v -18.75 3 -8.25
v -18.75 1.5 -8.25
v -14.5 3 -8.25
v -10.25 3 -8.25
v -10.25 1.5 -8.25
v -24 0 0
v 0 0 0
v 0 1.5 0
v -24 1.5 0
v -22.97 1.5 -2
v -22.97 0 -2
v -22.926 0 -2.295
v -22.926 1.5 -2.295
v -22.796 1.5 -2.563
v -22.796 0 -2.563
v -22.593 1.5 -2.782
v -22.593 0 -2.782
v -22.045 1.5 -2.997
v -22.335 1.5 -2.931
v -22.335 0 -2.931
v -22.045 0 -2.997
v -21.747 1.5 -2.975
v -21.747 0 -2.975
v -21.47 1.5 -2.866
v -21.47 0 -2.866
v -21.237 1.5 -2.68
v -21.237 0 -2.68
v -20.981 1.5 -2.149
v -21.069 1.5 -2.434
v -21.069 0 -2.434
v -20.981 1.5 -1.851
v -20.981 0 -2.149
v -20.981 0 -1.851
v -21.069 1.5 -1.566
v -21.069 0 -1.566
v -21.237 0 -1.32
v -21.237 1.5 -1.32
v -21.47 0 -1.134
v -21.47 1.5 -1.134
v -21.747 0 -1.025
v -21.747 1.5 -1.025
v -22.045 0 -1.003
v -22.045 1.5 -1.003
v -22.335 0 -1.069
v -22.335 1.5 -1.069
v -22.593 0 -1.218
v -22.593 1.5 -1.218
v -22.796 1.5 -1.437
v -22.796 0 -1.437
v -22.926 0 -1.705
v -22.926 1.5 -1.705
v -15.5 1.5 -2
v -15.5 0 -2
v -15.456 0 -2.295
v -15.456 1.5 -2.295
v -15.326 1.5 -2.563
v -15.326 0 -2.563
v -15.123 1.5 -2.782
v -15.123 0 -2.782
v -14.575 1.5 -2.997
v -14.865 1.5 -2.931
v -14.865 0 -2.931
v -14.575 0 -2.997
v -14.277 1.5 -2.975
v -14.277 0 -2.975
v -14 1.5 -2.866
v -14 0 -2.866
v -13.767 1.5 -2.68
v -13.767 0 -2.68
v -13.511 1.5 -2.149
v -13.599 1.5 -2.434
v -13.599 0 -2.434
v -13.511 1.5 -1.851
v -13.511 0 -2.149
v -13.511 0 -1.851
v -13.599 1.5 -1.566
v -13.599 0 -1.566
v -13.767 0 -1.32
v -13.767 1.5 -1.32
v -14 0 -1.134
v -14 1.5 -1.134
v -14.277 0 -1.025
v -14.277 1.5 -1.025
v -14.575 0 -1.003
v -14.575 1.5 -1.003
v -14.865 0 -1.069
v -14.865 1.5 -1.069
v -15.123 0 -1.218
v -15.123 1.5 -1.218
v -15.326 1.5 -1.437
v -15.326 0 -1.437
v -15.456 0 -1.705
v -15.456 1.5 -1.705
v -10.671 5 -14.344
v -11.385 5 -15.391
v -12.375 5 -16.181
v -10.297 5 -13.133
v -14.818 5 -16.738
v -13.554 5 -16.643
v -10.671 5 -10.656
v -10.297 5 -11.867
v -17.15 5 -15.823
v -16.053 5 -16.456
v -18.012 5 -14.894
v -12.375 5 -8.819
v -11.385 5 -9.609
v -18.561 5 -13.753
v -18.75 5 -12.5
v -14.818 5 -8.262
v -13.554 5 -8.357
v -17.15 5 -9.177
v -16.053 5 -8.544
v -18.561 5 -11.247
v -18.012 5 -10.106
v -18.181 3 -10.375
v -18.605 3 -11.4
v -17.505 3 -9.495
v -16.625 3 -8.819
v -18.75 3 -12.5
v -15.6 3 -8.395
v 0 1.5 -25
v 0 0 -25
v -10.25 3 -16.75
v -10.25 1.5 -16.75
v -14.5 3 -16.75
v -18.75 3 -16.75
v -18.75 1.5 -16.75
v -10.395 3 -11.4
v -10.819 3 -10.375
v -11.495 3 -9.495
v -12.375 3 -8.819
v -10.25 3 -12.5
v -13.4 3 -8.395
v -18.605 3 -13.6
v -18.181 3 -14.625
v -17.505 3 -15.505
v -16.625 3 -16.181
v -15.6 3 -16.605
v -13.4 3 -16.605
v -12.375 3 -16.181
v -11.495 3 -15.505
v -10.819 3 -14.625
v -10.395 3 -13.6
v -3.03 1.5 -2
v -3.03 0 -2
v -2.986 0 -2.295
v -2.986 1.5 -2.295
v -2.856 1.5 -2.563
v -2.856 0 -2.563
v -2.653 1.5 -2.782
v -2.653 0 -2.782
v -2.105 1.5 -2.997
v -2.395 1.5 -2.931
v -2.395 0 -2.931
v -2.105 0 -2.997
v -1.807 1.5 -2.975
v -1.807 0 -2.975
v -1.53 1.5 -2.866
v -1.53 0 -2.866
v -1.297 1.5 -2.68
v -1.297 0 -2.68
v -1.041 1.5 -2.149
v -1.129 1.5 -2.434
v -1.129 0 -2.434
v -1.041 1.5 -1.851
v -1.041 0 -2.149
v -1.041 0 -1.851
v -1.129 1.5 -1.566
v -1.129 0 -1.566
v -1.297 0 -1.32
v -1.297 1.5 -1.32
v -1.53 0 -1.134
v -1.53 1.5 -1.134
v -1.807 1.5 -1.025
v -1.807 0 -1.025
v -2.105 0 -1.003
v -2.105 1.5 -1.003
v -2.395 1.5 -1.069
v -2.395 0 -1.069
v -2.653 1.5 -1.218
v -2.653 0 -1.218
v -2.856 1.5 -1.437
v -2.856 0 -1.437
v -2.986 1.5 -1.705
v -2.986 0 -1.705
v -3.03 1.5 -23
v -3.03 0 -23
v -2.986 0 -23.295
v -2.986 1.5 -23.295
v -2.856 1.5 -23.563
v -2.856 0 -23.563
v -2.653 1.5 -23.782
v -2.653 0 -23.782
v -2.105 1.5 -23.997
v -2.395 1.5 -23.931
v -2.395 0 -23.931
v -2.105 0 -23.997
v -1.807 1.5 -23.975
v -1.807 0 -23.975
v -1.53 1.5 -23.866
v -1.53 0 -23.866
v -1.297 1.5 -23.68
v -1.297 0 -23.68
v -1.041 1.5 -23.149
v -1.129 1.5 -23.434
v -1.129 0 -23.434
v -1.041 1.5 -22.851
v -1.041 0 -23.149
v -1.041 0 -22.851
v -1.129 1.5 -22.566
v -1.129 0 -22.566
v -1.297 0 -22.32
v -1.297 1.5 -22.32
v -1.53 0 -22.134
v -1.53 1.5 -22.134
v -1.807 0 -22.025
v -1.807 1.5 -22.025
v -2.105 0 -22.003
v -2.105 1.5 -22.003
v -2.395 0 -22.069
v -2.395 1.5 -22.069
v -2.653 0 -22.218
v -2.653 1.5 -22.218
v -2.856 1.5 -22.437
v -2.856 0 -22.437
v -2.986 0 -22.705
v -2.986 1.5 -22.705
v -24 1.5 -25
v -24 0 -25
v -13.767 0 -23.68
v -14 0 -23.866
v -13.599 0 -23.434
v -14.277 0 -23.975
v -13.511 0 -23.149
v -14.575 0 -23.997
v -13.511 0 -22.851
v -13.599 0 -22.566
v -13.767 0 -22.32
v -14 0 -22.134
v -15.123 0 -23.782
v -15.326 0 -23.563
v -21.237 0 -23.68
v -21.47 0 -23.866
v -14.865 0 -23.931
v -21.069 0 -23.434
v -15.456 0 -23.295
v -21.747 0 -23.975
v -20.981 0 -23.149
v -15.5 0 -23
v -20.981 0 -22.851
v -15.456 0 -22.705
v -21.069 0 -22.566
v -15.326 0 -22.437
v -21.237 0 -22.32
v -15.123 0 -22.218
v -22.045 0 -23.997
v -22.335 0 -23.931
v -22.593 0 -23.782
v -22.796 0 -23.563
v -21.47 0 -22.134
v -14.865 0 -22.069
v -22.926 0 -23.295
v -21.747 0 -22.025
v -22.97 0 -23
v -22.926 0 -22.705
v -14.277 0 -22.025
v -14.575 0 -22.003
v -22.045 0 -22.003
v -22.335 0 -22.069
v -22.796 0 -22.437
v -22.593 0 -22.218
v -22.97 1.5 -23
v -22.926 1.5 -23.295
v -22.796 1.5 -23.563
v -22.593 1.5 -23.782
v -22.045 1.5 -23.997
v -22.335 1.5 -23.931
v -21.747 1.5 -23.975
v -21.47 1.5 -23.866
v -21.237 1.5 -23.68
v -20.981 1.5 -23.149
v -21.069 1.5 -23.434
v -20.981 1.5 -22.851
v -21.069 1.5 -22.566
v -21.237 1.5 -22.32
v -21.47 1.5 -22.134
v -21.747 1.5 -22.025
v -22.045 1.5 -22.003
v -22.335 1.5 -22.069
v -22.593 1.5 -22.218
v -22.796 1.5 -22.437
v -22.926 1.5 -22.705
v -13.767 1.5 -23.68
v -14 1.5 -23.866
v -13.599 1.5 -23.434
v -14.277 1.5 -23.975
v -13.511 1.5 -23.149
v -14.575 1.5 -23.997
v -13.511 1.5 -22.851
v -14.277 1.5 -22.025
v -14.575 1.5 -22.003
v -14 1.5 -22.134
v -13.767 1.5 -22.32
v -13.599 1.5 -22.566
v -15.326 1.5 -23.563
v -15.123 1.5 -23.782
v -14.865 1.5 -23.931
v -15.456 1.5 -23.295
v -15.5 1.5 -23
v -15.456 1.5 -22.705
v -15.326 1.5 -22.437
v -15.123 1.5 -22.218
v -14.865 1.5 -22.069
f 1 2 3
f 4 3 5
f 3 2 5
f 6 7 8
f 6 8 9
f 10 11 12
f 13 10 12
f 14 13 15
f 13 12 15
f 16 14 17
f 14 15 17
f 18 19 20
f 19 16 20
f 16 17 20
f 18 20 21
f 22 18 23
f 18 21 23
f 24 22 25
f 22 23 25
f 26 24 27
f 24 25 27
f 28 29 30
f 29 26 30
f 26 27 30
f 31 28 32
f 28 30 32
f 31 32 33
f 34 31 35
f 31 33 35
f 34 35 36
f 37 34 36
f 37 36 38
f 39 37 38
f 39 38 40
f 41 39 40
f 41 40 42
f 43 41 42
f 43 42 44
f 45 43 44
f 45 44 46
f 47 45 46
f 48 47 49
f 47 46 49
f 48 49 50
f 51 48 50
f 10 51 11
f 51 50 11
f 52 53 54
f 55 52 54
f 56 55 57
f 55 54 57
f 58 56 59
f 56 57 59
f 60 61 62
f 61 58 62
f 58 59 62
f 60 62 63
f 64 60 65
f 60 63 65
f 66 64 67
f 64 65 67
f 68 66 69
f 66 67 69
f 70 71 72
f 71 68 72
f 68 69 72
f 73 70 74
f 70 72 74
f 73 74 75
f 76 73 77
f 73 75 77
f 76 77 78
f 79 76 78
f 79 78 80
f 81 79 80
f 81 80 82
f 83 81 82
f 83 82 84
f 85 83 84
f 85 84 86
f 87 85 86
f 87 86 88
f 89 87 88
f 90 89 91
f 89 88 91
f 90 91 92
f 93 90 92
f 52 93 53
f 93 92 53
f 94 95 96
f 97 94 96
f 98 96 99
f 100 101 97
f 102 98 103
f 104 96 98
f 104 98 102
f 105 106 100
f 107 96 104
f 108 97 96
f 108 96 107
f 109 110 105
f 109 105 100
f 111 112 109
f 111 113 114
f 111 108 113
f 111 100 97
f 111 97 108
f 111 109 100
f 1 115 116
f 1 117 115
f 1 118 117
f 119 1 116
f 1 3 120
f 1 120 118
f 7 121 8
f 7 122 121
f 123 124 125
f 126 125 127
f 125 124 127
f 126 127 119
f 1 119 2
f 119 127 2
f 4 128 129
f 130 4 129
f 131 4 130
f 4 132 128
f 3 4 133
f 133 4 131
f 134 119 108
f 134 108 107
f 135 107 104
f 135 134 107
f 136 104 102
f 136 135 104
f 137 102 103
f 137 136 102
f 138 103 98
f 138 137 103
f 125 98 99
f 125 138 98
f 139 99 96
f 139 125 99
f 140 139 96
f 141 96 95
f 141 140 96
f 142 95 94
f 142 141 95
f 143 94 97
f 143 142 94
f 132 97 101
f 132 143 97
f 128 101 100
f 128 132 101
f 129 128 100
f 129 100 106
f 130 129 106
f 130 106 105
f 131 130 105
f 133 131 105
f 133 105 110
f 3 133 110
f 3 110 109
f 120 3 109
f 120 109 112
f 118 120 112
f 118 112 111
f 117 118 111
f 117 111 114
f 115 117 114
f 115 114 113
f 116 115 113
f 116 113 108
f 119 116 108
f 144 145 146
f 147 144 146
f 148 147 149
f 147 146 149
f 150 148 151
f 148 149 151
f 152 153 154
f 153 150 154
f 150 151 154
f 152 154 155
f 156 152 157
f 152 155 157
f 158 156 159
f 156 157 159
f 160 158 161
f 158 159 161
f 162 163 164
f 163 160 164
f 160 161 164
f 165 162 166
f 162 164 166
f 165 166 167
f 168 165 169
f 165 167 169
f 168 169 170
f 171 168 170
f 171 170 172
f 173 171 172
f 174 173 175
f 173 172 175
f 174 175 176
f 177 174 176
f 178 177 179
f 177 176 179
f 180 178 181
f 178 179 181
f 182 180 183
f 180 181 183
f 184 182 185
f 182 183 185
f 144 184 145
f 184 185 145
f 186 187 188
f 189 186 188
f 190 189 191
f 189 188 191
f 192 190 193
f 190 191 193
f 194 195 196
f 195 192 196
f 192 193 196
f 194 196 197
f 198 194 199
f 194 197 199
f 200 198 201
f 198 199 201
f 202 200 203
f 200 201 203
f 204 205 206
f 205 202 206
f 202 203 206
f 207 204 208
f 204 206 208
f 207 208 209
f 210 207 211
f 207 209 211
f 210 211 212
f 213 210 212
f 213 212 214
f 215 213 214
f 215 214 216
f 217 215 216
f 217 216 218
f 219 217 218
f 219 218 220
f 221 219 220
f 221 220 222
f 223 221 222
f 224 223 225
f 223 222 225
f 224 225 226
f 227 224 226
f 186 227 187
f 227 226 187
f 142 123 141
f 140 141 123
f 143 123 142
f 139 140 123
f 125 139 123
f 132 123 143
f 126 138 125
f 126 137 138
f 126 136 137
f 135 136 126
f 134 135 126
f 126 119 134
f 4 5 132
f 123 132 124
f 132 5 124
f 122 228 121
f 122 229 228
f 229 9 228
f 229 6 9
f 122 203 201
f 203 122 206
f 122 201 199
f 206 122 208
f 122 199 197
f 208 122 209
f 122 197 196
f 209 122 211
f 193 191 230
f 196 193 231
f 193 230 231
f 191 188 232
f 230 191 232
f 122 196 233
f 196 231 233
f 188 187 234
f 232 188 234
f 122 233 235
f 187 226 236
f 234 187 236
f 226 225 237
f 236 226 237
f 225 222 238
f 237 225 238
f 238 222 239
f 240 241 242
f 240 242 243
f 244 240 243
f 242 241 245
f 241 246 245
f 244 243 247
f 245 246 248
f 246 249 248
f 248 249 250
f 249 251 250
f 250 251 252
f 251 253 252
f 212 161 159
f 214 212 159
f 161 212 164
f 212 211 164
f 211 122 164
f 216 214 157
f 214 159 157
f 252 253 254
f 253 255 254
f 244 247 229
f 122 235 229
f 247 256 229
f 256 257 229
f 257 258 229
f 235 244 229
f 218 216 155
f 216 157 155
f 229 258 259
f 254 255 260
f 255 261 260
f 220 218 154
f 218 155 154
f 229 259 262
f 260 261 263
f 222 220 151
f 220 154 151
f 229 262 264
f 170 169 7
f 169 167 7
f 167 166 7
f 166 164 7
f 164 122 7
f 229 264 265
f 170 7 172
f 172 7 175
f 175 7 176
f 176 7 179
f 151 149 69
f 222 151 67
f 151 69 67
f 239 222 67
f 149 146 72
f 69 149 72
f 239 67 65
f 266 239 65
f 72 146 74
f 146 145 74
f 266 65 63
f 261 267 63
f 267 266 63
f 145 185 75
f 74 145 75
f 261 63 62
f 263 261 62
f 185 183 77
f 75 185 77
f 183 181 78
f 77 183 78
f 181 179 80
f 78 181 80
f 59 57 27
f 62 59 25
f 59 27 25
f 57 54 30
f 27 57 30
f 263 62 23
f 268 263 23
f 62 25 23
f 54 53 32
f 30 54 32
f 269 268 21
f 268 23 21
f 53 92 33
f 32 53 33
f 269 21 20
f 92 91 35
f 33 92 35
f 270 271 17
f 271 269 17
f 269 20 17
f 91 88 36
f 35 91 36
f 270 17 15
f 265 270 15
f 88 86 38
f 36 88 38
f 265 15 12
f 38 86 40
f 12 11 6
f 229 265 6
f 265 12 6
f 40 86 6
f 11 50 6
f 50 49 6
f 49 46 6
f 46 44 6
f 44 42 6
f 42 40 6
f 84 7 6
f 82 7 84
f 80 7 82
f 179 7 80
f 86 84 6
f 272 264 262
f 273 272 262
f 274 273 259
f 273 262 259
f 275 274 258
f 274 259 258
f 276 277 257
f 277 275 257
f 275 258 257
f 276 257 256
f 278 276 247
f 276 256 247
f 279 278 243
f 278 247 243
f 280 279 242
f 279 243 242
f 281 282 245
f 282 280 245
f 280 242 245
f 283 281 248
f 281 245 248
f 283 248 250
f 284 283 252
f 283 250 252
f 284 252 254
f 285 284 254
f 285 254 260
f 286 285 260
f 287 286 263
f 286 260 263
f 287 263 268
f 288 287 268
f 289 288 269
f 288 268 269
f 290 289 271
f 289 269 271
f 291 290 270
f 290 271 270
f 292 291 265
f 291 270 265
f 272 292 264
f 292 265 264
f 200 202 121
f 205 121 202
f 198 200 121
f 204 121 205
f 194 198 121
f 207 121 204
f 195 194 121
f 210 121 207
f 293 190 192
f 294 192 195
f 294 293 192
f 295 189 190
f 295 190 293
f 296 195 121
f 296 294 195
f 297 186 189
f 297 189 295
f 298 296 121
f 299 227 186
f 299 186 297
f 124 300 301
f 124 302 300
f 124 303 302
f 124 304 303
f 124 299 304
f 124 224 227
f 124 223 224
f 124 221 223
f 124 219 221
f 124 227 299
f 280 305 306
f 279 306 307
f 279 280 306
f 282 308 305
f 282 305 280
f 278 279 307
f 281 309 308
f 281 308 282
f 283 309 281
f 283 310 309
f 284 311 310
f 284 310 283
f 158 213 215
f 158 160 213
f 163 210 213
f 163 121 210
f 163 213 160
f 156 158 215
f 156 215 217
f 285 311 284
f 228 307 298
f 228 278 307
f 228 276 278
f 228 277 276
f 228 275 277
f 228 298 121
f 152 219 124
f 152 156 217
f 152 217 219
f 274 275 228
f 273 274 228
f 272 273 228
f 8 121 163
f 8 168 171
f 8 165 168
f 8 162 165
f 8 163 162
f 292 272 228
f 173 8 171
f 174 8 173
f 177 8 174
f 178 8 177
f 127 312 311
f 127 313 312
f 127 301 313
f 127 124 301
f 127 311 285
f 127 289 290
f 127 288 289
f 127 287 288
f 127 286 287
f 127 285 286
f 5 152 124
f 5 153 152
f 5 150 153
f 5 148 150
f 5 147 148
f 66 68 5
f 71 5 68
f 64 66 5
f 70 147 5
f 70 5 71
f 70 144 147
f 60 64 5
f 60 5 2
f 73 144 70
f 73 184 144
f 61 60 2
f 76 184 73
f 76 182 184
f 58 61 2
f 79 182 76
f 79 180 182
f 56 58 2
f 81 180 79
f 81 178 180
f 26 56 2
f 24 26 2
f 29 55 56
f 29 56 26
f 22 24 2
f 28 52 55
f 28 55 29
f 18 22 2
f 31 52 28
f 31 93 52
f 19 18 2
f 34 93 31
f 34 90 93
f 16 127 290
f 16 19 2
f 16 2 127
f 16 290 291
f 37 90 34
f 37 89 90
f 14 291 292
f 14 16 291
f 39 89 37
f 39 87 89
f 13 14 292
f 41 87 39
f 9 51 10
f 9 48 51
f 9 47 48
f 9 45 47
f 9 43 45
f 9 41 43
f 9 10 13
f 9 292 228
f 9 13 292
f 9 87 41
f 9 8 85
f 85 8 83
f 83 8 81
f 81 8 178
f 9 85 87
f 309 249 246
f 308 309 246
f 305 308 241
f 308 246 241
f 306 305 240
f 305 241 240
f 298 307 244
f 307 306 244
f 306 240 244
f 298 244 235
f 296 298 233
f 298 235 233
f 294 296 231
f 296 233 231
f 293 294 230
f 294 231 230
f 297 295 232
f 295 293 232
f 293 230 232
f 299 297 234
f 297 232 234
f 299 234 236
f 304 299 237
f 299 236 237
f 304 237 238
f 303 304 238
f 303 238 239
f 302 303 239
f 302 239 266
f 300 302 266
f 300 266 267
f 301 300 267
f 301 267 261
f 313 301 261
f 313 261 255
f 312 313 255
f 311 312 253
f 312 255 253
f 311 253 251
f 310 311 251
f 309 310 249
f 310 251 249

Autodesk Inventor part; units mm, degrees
ref_plane "YZ Plane" through (0, 0, 0) normal (1, 0, 0) x (0, 1, 0)
ref_plane "XZ Plane" through (0, 0, 0) normal (0, 1, 0) x (-1, 0, 0)
ref_plane "XY Plane" through (0, 0, 0) normal (0, 0, 1) x (1, 0, 0)
sketch "스케치1" plane through (0, 0, 0) normal (0, 1, 0) x (-1, 0, 0)
  line L0 (0, 0) -> (24, 0)
  line L1 (24, 0) -> (24, -25)
  line L2 (24, -25) -> (0, -25)
  line L3 (0, -25) -> (0, 0)
  circle A0 centre (21.97, -2) radius 1
  circle A1 centre (2.03, -2) radius 1
  circle A2 centre (14.5, -2) radius 1
  circle A3 centre (21.97, -23) radius 1
  circle A4 centre (14.5, -23) radius 1
  circle A5 centre (2.03, -23) radius 1
  line L4 (18.75, -8.25) -> (10.25, -8.25)
  line L5 (10.25, -8.25) -> (10.25, -16.75)
  line L6 (10.25, -16.75) -> (18.75, -16.75)
  line L7 (18.75, -16.75) -> (18.75, -8.25)
  circle A6 centre (14.5, -12.5) radius 4.25
  point P0 (0, -12.5)
  point P1 (14.5, -8.25)
  point P2 (18.75, -12.5)
  point P3 (14.5, -16.75)
  point P4 (10.25, -12.5)
  dimension "d0" = 24
  dimension "d1" = 25
  dimension "d2" = 2
  dimension "d3" = 2
  dimension "d4" = 2
  dimension "d5" = 2
  dimension "d7" = 2
  dimension "d8" = 2
  dimension "d9" = 2
  dimension "d10" = 2
  dimension "d11" = 2.03
  dimension "d12" = 2.03
  dimension "d13" = 21
  dimension "d14" = 21
  dimension "d15" = 21
  dimension "d16" = 14.5
  dimension "d17" = 14.5
  dimension "d18" = 2.03
  dimension "d19" = 2.03
  dimension "d23" = 8.5
  dimension "d24" = 8.5
  dimension "d25" = 14.5
  dimension "d26" = 12.5
extrude "돌출1" add sketch "스케치1" along normal blind 1.5
extrude "돌출2" add sketch "스케치1" along normal blind 3 contours L7 A6 L4 | A6 L5 L4 | L7 L6 A6 | A6 L6 L5
extrude "돌출3" add sketch "스케치1" along normal blind 5 contours A6
properties part number "pasapery pi camera"
